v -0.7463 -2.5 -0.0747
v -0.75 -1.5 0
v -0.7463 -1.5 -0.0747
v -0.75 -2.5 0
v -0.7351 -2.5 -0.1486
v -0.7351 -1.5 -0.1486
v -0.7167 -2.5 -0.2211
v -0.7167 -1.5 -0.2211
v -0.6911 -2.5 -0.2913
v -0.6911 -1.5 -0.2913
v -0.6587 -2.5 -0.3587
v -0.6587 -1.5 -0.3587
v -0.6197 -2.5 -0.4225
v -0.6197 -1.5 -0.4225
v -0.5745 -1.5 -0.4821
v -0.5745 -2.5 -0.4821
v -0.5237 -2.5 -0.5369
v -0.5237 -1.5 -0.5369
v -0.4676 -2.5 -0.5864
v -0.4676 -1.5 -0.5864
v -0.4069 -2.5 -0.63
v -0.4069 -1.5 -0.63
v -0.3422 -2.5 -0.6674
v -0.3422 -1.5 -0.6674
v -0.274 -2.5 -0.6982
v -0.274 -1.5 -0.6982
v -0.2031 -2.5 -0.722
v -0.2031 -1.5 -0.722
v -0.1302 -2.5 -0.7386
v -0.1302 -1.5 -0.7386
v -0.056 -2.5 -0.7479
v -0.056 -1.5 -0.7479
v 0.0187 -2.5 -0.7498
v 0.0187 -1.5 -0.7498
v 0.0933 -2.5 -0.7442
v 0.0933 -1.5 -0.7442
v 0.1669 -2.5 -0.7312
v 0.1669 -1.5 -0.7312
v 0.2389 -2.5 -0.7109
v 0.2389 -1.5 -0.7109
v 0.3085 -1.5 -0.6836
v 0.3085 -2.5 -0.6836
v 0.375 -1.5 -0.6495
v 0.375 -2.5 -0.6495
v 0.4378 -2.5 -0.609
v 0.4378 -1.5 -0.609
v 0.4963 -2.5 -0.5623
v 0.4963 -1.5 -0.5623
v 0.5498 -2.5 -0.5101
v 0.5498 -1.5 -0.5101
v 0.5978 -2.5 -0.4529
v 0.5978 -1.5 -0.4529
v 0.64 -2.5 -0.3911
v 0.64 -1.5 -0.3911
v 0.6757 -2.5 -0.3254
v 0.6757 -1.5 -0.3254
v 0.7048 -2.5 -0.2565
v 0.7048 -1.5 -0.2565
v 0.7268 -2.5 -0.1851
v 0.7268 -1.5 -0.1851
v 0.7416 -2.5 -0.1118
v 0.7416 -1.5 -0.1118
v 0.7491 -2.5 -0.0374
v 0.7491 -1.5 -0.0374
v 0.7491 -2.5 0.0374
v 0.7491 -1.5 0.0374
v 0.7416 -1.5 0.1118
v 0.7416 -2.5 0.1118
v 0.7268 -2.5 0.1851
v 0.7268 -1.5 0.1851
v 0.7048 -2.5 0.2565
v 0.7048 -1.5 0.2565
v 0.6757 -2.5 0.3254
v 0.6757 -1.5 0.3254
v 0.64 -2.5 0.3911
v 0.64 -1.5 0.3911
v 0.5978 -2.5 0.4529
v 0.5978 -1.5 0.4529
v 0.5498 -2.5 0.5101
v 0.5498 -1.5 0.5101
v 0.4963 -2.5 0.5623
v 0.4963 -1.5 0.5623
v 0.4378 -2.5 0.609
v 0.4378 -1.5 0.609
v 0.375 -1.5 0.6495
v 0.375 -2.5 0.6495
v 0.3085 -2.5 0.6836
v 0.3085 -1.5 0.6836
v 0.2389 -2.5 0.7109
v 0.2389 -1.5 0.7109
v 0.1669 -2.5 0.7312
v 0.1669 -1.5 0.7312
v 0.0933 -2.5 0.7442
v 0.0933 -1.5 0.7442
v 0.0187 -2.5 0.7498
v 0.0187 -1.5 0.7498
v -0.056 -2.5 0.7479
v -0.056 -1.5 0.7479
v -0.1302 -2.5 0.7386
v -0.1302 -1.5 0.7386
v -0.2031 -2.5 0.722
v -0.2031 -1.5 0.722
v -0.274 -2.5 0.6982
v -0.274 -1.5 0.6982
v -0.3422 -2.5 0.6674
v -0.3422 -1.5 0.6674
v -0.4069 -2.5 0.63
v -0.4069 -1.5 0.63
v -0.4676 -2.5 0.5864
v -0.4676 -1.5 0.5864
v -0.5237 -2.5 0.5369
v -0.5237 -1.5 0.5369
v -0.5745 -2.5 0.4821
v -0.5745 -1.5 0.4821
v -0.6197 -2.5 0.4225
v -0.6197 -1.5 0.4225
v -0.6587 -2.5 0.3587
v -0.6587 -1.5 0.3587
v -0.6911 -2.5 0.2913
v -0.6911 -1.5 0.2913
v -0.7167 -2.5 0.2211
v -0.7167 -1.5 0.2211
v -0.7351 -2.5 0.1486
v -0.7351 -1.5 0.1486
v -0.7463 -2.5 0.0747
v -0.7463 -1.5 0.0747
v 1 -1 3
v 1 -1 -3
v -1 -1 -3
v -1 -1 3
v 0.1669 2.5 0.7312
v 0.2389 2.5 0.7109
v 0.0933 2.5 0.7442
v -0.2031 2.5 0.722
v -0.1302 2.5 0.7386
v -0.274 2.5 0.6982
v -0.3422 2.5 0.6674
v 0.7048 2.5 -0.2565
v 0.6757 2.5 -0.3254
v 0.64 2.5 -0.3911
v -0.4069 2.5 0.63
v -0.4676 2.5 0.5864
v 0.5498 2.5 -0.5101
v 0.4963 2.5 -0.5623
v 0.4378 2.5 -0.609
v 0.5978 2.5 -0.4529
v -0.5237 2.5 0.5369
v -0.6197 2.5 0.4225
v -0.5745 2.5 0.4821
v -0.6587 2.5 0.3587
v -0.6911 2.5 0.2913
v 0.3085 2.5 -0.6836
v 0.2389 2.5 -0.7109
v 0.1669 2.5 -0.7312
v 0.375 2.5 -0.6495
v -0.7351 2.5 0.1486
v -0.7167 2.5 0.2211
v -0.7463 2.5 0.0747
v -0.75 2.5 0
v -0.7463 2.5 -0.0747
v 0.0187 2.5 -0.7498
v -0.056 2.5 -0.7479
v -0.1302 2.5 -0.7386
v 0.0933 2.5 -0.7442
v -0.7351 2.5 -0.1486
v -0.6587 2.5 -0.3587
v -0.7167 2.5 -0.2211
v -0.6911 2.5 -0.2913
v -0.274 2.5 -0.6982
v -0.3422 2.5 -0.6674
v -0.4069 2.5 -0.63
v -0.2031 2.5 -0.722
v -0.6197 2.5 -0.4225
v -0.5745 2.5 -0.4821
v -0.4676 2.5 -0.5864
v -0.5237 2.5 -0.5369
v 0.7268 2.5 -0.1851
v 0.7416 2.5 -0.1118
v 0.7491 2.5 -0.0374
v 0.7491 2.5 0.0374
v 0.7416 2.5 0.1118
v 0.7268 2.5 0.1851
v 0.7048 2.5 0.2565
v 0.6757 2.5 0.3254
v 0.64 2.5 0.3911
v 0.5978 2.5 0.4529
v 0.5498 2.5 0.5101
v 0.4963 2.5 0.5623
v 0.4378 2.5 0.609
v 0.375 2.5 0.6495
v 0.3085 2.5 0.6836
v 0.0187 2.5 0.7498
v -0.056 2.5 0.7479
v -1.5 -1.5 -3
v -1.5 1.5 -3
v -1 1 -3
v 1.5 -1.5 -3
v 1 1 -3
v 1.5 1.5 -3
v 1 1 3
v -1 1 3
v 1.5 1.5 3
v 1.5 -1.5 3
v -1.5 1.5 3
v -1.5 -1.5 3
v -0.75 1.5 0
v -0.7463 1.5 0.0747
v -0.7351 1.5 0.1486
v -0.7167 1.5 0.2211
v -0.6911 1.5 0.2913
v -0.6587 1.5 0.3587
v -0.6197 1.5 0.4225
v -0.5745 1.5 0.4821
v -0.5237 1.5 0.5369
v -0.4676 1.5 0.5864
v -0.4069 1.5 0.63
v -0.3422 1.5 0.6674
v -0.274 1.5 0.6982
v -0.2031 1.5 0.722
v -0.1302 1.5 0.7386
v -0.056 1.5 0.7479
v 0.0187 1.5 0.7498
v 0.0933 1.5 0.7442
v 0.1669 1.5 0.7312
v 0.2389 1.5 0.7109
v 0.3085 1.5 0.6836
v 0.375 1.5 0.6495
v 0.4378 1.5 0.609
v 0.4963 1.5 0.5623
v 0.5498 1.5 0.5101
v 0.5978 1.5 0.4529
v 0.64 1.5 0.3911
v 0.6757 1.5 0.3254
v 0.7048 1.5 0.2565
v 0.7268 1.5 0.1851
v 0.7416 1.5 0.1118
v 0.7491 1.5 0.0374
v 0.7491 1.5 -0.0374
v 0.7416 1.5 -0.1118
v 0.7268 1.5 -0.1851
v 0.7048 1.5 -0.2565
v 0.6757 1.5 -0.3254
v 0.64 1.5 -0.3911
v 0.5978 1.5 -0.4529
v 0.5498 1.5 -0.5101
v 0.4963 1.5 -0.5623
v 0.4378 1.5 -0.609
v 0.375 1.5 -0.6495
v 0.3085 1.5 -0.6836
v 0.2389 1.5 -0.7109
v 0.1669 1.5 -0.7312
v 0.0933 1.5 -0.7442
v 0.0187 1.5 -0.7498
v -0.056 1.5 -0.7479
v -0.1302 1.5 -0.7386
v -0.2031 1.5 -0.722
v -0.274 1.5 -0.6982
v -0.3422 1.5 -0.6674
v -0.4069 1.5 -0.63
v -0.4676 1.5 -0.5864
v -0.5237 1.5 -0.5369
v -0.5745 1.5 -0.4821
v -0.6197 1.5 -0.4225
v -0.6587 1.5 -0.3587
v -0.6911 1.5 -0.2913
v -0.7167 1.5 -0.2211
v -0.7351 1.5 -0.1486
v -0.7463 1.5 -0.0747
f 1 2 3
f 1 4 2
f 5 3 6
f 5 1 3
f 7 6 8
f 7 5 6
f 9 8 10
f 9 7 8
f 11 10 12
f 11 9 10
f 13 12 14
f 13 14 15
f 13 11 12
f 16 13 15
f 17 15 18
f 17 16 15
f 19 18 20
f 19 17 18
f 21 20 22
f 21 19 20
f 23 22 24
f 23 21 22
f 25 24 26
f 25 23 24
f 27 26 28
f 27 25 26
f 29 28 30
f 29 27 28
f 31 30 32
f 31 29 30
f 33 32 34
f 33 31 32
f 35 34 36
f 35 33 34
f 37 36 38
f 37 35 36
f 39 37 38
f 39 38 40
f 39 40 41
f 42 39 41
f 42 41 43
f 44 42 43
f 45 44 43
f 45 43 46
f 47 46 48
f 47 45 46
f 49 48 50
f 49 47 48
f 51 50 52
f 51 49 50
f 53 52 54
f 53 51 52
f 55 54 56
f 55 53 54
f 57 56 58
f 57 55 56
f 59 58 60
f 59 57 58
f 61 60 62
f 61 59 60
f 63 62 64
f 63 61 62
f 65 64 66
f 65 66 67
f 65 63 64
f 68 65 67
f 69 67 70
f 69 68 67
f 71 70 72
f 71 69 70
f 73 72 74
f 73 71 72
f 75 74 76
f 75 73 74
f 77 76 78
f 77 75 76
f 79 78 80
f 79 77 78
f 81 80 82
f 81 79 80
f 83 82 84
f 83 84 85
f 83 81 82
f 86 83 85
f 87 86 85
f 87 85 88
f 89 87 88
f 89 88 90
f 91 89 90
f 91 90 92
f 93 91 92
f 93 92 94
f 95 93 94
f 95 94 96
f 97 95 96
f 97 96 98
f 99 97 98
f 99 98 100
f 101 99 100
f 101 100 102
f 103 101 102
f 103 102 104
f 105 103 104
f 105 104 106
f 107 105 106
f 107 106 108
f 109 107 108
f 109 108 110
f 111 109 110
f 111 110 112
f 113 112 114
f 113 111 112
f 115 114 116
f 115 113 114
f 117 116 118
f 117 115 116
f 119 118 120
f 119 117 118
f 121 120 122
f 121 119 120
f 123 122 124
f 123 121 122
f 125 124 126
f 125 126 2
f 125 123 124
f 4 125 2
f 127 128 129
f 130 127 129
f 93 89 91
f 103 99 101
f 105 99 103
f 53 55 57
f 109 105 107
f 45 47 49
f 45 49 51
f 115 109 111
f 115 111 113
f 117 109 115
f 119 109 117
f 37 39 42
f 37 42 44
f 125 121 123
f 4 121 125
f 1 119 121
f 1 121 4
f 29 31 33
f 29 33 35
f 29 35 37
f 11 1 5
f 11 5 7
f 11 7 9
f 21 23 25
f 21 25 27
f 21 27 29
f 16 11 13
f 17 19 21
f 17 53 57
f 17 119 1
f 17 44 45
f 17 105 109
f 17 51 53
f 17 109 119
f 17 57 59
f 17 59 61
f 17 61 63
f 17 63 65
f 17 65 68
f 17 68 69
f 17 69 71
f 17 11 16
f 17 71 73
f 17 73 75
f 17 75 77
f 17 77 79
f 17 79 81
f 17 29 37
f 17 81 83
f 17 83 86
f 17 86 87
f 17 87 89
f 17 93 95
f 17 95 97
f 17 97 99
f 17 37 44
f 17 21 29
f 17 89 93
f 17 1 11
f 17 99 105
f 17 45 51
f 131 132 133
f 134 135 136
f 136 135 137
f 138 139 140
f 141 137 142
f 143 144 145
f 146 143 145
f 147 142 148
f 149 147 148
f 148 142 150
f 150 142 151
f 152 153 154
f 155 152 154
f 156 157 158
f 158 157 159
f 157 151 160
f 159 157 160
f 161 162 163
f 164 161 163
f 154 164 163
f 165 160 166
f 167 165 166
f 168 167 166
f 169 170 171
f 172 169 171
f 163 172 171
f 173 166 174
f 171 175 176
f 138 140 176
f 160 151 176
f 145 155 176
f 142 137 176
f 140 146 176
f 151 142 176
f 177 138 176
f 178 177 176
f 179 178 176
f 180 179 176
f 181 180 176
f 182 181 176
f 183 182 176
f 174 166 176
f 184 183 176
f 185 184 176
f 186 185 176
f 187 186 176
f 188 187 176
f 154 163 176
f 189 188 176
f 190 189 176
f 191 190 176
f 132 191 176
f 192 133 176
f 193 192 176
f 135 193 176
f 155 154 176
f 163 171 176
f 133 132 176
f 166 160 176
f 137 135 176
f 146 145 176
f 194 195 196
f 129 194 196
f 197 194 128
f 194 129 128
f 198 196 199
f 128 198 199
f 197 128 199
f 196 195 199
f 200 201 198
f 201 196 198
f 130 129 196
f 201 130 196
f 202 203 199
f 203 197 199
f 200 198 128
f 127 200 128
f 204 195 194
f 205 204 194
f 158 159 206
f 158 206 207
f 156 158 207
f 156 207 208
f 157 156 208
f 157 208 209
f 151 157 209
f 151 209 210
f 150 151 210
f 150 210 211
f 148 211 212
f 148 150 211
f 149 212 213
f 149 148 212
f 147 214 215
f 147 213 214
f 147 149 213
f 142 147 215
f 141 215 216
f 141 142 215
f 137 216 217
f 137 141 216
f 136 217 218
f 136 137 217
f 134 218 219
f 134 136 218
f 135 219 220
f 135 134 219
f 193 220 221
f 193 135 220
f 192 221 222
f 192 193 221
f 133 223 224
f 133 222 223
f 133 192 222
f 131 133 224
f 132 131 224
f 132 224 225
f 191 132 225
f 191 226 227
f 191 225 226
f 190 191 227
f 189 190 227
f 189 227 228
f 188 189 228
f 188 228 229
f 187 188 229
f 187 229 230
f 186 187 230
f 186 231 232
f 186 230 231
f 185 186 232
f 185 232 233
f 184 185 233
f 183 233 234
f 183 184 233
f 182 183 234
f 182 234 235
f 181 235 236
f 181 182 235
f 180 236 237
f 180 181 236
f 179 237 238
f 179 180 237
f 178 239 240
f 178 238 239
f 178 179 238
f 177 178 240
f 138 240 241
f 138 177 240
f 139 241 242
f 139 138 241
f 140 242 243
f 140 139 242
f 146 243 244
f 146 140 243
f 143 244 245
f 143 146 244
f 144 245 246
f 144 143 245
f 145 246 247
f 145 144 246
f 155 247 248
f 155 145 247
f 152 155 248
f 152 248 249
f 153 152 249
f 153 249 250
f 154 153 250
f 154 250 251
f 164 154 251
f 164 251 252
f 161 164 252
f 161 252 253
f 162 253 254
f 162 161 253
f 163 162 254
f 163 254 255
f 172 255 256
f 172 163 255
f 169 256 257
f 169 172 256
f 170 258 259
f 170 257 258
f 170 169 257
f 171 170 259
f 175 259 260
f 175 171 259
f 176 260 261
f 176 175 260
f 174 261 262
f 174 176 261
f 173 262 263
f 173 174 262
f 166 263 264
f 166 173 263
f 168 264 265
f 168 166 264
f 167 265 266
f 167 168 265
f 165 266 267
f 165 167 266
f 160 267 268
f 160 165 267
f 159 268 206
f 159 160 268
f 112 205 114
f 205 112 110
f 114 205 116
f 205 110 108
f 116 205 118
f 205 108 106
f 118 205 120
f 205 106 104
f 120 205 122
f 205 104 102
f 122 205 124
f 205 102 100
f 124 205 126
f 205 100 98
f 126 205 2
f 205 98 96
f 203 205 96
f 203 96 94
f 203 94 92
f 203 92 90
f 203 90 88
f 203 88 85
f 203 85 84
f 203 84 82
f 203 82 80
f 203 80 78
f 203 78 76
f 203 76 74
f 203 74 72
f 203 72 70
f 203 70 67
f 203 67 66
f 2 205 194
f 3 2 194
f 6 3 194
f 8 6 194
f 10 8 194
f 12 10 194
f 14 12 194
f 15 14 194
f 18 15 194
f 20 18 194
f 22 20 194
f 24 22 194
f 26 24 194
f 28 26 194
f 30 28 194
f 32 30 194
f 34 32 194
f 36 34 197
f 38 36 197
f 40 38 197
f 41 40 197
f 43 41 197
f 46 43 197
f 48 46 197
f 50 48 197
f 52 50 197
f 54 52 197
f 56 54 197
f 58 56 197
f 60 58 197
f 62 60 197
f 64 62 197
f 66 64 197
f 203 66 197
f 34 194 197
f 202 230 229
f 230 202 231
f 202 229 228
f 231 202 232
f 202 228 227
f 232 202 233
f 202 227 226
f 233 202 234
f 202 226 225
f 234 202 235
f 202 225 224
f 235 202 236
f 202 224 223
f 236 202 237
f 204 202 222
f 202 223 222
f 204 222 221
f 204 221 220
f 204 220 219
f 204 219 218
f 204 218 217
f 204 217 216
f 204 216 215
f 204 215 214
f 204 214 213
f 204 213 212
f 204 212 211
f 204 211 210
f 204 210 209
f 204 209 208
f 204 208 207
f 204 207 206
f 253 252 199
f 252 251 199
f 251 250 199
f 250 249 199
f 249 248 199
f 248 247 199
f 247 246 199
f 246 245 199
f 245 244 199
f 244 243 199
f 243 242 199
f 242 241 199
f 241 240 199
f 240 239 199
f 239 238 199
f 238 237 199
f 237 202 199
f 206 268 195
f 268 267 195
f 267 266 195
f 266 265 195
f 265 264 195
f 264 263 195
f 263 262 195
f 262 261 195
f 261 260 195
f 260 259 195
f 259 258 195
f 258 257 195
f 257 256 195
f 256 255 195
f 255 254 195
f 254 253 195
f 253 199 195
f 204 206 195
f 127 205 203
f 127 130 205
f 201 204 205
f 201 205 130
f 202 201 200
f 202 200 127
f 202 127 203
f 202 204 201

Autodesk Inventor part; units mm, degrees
ref_plane "YZ Plane" through (0, 0, 0) normal (1, 0, 0) x (0, 1, 0)
ref_plane "XZ Plane" through (0, 0, 0) normal (0, 1, 0) x (-1, 0, 0)
ref_plane "XY Plane" through (0, 0, 0) normal (0, 0, 1) x (1, 0, 0)
sketch "Sketch9" plane through (0, 0, 0) normal (0, 0, 1) x (1, 0, 0)
  line L0 (1, 1) -> (1, -1)
  line L1 (1, -1) -> (-1, -1)
  line L2 (-1, -1) -> (-1, 1)
  line L3 (-1, 1) -> (1, 1)
  line L4 (-1.5, 1.5) -> (-1.5, -1.5)
  line L5 (-1.5, -1.5) -> (1.5, -1.5)
  line L6 (1.5, -1.5) -> (1.5, 1.5)
  line L7 (1.5, 1.5) -> (-1.5, 1.5)
  point P0 (0, 0)
  dimension "d36" = 2
  dimension "d37" = 3
extrude "Extrusion7" add sketch "Sketch9" along normal mid plane 6
sketch "Sketch10" plane through (0, 0, 0) normal (0, 0, 1) x (1, 0, 0)
  line L0 (-1.5, 1.5) -> (1.5, 1.5) projected
  line L1 (1.5, -1.5) -> (-1.5, -1.5) projected
  line L2 (0, 1.5) -> (0, -1.5) construction
  line L3 (0, 1.5) -> (-0.75, 1.5)
  line L4 (-0.75, 1.5) -> (-0.75, 2.5)
  line L5 (-0.75, 2.5) -> (0, 2.5)
  line L6 (0, 2.5) -> (0, 1.5)
  line L7 (0, -1.5) -> (-0.75, -1.5)
  line L8 (-0.75, -1.5) -> (-0.75, -2.5)
  line L9 (-0.75, -2.5) -> (0, -2.5)
  line L10 (0, -2.5) -> (0, -1.5)
  dimension "d40" = 0.75
  dimension "d42" = 1
  dimension "d43" = 1
revolve "Revolution2" add sketch "Sketch10" angle 360 about axis through (0, 1.5, 0) along (0, -1, 0)
properties part number "SlderA"
